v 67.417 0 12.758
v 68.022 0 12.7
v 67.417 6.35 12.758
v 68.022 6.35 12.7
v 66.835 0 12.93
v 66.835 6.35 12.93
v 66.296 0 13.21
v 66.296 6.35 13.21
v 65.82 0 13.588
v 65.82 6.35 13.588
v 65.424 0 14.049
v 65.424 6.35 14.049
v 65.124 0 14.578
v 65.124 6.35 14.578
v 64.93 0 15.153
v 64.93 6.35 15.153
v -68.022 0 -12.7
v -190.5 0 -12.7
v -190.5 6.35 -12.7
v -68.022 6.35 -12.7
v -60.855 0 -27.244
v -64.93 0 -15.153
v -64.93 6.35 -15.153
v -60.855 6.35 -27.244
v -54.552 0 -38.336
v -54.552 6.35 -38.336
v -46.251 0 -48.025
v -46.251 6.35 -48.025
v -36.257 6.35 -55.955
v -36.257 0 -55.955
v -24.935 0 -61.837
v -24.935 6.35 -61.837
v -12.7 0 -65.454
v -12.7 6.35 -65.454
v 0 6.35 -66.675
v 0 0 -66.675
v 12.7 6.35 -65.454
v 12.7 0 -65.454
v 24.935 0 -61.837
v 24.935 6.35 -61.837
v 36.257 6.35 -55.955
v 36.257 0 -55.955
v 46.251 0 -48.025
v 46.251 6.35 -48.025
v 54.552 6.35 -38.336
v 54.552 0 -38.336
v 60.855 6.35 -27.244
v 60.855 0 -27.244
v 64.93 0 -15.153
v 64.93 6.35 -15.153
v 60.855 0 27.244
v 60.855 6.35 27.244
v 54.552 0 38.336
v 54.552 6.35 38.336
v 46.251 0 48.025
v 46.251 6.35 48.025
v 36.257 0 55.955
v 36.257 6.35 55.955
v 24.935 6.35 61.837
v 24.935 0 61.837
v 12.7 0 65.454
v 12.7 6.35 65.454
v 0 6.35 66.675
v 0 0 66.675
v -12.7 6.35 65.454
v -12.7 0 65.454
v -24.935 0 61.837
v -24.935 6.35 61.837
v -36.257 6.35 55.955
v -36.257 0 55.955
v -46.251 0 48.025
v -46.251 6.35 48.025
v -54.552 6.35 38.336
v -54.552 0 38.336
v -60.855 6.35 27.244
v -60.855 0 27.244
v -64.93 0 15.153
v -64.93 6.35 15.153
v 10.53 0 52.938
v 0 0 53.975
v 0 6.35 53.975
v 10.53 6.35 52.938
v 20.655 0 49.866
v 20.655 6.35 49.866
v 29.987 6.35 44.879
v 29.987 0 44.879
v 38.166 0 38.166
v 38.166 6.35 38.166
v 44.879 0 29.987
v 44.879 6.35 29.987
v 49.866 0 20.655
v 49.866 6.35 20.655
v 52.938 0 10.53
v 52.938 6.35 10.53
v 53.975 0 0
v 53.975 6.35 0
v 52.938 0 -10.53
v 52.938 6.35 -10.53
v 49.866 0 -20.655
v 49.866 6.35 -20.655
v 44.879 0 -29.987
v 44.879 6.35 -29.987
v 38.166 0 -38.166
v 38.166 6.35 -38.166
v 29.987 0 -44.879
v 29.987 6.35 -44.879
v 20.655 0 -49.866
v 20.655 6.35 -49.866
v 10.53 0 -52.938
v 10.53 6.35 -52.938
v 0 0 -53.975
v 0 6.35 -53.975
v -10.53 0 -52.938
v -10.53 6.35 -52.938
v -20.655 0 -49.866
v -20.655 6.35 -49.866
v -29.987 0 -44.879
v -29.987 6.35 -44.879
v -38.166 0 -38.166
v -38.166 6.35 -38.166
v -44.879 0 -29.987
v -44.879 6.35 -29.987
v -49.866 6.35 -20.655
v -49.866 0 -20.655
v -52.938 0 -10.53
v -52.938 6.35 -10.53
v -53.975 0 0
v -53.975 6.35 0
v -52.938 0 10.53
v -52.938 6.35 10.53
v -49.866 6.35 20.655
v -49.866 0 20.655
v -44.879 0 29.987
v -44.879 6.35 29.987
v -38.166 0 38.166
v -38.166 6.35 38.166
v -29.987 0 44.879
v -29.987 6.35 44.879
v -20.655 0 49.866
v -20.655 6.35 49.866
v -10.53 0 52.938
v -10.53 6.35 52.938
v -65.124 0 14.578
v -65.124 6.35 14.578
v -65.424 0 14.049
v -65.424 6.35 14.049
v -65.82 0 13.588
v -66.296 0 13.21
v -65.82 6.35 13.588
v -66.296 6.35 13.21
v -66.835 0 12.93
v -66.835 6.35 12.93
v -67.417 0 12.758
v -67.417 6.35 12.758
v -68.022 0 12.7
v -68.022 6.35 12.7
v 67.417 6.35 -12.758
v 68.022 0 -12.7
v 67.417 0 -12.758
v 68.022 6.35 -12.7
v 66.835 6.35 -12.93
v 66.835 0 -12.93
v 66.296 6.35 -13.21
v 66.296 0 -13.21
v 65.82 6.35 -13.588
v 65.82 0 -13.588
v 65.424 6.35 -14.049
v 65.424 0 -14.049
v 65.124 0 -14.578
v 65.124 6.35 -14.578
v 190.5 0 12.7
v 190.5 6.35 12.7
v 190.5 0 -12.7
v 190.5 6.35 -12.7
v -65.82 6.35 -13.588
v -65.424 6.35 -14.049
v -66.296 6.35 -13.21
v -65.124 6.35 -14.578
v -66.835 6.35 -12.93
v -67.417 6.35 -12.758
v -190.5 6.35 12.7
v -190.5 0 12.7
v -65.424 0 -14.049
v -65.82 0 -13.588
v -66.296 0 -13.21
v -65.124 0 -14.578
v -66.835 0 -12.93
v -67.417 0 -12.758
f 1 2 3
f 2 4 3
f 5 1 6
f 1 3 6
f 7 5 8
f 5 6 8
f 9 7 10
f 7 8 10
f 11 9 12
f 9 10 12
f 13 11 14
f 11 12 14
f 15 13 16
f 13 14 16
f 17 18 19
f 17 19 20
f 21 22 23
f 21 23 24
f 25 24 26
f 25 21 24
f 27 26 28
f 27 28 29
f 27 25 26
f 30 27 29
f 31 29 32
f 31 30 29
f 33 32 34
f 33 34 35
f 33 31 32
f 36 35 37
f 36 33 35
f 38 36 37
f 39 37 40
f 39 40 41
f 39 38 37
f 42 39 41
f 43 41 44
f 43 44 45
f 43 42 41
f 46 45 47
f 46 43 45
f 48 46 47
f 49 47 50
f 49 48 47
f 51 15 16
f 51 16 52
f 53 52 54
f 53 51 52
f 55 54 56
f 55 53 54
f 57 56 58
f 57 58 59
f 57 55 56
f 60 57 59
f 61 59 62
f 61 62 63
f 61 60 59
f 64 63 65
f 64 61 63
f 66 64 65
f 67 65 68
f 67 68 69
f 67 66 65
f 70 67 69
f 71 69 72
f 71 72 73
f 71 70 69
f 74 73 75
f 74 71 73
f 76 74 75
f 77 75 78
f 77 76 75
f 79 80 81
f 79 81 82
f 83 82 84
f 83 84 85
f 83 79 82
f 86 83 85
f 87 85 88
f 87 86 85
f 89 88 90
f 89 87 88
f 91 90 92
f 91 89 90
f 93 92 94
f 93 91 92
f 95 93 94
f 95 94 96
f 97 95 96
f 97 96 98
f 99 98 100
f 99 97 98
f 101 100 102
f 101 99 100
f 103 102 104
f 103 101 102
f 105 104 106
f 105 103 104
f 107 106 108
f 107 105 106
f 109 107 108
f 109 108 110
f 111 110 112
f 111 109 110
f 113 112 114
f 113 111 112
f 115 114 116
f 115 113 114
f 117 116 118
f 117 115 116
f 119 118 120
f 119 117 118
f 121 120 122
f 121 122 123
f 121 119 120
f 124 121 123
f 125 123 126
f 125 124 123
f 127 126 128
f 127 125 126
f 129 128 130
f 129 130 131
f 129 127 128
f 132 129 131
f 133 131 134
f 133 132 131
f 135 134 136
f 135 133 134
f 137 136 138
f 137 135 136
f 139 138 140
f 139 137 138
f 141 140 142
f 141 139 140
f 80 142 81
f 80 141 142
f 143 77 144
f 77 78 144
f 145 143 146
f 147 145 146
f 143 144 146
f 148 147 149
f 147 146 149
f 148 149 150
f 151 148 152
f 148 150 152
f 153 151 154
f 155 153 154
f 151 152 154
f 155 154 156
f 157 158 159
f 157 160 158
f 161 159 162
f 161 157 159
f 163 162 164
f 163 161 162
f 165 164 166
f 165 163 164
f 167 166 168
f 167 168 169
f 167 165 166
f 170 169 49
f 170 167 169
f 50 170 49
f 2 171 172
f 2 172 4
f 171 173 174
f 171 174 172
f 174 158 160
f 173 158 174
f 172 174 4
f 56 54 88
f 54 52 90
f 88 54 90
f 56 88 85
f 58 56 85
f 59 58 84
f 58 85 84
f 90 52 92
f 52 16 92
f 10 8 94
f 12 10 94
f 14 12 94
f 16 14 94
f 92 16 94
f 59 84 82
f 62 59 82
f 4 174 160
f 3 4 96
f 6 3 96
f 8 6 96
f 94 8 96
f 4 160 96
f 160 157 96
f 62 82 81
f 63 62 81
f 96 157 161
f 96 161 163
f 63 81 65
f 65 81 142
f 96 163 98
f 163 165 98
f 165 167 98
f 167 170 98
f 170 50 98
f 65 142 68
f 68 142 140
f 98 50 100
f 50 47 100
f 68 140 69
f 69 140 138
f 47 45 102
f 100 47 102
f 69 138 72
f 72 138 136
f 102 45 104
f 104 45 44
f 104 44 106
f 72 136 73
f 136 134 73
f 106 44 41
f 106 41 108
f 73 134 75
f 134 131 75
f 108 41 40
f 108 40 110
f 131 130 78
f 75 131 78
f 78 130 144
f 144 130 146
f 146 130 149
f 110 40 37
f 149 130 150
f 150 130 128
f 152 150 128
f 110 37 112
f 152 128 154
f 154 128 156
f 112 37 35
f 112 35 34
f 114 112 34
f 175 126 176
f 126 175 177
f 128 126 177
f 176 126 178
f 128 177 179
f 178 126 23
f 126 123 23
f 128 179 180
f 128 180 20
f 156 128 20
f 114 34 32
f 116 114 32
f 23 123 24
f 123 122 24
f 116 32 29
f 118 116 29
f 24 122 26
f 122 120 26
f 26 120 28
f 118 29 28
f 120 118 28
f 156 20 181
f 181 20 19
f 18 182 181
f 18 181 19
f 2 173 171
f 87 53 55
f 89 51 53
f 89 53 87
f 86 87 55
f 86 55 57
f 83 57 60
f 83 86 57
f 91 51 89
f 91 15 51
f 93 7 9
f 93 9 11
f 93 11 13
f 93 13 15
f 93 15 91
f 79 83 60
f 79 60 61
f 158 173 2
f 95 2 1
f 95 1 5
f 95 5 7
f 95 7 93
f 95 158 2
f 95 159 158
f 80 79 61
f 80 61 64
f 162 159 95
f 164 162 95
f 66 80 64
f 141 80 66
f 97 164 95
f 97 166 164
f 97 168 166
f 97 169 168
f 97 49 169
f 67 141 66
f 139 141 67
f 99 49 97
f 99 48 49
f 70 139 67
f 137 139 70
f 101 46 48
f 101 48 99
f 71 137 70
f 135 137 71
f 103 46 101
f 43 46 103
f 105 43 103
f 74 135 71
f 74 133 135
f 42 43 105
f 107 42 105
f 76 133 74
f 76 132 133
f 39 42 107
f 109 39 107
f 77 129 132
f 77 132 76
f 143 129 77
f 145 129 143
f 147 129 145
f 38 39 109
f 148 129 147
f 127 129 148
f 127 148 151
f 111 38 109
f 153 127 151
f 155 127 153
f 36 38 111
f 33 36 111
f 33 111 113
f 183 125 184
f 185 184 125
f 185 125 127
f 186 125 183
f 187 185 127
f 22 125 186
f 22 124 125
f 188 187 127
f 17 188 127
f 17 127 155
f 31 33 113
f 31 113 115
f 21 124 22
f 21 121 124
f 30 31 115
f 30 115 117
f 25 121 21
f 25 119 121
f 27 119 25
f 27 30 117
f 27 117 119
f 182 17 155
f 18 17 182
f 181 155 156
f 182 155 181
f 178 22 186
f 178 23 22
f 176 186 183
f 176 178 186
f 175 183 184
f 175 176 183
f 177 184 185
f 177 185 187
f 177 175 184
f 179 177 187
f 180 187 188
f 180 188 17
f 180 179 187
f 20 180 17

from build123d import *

# Parameters (mm, degrees)
SKETCH1_R           = 53.975
BOSS_EXTRUDE1_DEPTH = 6.35
FILLET1_R           = 3.175


with BuildPart() as part:
    # Sketch1 → Boss-Extrude1 (new body)
    with BuildSketch(Plane(origin=(0, 0, 0), x_dir=(1, 0, 0), z_dir=(0, 1, 0))):
        with BuildLine():
            Line((65.454301807, 12.7), (190.5, 12.7))
            Line((190.5, 12.7), (190.5, -12.7))
            Line((190.5, -12.7), (65.454301807, -12.7))
            ThreePointArc((65.454301807, -12.7), (0, -66.675), (-65.454301807, -12.7))
            Line((-65.454301807, -12.7), (-190.5, -12.7))
            Line((-190.5, -12.7), (-190.5, 12.7))
            Line((-190.5, 12.7), (-65.454301807, 12.7))
            ThreePointArc((-65.454301807, 12.7), (0, 66.675), (65.454301807, 12.7))
        make_face()
        with Locations(Location((0, 0, 0), (0, 0, 270))):
            Circle(SKETCH1_R, mode=Mode.SUBTRACT)
    extrude(amount=BOSS_EXTRUDE1_DEPTH)

    # Fillet1
    fillet1_edges = [part.edges().sort_by_distance(p)[0] for p in [
        (65.454301807, 3.175, 12.7),
        (-65.454301807, 3.175, 12.7),
        (-65.454301807, 3.175, -12.7),
        (65.454301807, 3.175, -12.7),
    ]]
    fillet(fillet1_edges, radius=FILLET1_R)


solid = part.part
